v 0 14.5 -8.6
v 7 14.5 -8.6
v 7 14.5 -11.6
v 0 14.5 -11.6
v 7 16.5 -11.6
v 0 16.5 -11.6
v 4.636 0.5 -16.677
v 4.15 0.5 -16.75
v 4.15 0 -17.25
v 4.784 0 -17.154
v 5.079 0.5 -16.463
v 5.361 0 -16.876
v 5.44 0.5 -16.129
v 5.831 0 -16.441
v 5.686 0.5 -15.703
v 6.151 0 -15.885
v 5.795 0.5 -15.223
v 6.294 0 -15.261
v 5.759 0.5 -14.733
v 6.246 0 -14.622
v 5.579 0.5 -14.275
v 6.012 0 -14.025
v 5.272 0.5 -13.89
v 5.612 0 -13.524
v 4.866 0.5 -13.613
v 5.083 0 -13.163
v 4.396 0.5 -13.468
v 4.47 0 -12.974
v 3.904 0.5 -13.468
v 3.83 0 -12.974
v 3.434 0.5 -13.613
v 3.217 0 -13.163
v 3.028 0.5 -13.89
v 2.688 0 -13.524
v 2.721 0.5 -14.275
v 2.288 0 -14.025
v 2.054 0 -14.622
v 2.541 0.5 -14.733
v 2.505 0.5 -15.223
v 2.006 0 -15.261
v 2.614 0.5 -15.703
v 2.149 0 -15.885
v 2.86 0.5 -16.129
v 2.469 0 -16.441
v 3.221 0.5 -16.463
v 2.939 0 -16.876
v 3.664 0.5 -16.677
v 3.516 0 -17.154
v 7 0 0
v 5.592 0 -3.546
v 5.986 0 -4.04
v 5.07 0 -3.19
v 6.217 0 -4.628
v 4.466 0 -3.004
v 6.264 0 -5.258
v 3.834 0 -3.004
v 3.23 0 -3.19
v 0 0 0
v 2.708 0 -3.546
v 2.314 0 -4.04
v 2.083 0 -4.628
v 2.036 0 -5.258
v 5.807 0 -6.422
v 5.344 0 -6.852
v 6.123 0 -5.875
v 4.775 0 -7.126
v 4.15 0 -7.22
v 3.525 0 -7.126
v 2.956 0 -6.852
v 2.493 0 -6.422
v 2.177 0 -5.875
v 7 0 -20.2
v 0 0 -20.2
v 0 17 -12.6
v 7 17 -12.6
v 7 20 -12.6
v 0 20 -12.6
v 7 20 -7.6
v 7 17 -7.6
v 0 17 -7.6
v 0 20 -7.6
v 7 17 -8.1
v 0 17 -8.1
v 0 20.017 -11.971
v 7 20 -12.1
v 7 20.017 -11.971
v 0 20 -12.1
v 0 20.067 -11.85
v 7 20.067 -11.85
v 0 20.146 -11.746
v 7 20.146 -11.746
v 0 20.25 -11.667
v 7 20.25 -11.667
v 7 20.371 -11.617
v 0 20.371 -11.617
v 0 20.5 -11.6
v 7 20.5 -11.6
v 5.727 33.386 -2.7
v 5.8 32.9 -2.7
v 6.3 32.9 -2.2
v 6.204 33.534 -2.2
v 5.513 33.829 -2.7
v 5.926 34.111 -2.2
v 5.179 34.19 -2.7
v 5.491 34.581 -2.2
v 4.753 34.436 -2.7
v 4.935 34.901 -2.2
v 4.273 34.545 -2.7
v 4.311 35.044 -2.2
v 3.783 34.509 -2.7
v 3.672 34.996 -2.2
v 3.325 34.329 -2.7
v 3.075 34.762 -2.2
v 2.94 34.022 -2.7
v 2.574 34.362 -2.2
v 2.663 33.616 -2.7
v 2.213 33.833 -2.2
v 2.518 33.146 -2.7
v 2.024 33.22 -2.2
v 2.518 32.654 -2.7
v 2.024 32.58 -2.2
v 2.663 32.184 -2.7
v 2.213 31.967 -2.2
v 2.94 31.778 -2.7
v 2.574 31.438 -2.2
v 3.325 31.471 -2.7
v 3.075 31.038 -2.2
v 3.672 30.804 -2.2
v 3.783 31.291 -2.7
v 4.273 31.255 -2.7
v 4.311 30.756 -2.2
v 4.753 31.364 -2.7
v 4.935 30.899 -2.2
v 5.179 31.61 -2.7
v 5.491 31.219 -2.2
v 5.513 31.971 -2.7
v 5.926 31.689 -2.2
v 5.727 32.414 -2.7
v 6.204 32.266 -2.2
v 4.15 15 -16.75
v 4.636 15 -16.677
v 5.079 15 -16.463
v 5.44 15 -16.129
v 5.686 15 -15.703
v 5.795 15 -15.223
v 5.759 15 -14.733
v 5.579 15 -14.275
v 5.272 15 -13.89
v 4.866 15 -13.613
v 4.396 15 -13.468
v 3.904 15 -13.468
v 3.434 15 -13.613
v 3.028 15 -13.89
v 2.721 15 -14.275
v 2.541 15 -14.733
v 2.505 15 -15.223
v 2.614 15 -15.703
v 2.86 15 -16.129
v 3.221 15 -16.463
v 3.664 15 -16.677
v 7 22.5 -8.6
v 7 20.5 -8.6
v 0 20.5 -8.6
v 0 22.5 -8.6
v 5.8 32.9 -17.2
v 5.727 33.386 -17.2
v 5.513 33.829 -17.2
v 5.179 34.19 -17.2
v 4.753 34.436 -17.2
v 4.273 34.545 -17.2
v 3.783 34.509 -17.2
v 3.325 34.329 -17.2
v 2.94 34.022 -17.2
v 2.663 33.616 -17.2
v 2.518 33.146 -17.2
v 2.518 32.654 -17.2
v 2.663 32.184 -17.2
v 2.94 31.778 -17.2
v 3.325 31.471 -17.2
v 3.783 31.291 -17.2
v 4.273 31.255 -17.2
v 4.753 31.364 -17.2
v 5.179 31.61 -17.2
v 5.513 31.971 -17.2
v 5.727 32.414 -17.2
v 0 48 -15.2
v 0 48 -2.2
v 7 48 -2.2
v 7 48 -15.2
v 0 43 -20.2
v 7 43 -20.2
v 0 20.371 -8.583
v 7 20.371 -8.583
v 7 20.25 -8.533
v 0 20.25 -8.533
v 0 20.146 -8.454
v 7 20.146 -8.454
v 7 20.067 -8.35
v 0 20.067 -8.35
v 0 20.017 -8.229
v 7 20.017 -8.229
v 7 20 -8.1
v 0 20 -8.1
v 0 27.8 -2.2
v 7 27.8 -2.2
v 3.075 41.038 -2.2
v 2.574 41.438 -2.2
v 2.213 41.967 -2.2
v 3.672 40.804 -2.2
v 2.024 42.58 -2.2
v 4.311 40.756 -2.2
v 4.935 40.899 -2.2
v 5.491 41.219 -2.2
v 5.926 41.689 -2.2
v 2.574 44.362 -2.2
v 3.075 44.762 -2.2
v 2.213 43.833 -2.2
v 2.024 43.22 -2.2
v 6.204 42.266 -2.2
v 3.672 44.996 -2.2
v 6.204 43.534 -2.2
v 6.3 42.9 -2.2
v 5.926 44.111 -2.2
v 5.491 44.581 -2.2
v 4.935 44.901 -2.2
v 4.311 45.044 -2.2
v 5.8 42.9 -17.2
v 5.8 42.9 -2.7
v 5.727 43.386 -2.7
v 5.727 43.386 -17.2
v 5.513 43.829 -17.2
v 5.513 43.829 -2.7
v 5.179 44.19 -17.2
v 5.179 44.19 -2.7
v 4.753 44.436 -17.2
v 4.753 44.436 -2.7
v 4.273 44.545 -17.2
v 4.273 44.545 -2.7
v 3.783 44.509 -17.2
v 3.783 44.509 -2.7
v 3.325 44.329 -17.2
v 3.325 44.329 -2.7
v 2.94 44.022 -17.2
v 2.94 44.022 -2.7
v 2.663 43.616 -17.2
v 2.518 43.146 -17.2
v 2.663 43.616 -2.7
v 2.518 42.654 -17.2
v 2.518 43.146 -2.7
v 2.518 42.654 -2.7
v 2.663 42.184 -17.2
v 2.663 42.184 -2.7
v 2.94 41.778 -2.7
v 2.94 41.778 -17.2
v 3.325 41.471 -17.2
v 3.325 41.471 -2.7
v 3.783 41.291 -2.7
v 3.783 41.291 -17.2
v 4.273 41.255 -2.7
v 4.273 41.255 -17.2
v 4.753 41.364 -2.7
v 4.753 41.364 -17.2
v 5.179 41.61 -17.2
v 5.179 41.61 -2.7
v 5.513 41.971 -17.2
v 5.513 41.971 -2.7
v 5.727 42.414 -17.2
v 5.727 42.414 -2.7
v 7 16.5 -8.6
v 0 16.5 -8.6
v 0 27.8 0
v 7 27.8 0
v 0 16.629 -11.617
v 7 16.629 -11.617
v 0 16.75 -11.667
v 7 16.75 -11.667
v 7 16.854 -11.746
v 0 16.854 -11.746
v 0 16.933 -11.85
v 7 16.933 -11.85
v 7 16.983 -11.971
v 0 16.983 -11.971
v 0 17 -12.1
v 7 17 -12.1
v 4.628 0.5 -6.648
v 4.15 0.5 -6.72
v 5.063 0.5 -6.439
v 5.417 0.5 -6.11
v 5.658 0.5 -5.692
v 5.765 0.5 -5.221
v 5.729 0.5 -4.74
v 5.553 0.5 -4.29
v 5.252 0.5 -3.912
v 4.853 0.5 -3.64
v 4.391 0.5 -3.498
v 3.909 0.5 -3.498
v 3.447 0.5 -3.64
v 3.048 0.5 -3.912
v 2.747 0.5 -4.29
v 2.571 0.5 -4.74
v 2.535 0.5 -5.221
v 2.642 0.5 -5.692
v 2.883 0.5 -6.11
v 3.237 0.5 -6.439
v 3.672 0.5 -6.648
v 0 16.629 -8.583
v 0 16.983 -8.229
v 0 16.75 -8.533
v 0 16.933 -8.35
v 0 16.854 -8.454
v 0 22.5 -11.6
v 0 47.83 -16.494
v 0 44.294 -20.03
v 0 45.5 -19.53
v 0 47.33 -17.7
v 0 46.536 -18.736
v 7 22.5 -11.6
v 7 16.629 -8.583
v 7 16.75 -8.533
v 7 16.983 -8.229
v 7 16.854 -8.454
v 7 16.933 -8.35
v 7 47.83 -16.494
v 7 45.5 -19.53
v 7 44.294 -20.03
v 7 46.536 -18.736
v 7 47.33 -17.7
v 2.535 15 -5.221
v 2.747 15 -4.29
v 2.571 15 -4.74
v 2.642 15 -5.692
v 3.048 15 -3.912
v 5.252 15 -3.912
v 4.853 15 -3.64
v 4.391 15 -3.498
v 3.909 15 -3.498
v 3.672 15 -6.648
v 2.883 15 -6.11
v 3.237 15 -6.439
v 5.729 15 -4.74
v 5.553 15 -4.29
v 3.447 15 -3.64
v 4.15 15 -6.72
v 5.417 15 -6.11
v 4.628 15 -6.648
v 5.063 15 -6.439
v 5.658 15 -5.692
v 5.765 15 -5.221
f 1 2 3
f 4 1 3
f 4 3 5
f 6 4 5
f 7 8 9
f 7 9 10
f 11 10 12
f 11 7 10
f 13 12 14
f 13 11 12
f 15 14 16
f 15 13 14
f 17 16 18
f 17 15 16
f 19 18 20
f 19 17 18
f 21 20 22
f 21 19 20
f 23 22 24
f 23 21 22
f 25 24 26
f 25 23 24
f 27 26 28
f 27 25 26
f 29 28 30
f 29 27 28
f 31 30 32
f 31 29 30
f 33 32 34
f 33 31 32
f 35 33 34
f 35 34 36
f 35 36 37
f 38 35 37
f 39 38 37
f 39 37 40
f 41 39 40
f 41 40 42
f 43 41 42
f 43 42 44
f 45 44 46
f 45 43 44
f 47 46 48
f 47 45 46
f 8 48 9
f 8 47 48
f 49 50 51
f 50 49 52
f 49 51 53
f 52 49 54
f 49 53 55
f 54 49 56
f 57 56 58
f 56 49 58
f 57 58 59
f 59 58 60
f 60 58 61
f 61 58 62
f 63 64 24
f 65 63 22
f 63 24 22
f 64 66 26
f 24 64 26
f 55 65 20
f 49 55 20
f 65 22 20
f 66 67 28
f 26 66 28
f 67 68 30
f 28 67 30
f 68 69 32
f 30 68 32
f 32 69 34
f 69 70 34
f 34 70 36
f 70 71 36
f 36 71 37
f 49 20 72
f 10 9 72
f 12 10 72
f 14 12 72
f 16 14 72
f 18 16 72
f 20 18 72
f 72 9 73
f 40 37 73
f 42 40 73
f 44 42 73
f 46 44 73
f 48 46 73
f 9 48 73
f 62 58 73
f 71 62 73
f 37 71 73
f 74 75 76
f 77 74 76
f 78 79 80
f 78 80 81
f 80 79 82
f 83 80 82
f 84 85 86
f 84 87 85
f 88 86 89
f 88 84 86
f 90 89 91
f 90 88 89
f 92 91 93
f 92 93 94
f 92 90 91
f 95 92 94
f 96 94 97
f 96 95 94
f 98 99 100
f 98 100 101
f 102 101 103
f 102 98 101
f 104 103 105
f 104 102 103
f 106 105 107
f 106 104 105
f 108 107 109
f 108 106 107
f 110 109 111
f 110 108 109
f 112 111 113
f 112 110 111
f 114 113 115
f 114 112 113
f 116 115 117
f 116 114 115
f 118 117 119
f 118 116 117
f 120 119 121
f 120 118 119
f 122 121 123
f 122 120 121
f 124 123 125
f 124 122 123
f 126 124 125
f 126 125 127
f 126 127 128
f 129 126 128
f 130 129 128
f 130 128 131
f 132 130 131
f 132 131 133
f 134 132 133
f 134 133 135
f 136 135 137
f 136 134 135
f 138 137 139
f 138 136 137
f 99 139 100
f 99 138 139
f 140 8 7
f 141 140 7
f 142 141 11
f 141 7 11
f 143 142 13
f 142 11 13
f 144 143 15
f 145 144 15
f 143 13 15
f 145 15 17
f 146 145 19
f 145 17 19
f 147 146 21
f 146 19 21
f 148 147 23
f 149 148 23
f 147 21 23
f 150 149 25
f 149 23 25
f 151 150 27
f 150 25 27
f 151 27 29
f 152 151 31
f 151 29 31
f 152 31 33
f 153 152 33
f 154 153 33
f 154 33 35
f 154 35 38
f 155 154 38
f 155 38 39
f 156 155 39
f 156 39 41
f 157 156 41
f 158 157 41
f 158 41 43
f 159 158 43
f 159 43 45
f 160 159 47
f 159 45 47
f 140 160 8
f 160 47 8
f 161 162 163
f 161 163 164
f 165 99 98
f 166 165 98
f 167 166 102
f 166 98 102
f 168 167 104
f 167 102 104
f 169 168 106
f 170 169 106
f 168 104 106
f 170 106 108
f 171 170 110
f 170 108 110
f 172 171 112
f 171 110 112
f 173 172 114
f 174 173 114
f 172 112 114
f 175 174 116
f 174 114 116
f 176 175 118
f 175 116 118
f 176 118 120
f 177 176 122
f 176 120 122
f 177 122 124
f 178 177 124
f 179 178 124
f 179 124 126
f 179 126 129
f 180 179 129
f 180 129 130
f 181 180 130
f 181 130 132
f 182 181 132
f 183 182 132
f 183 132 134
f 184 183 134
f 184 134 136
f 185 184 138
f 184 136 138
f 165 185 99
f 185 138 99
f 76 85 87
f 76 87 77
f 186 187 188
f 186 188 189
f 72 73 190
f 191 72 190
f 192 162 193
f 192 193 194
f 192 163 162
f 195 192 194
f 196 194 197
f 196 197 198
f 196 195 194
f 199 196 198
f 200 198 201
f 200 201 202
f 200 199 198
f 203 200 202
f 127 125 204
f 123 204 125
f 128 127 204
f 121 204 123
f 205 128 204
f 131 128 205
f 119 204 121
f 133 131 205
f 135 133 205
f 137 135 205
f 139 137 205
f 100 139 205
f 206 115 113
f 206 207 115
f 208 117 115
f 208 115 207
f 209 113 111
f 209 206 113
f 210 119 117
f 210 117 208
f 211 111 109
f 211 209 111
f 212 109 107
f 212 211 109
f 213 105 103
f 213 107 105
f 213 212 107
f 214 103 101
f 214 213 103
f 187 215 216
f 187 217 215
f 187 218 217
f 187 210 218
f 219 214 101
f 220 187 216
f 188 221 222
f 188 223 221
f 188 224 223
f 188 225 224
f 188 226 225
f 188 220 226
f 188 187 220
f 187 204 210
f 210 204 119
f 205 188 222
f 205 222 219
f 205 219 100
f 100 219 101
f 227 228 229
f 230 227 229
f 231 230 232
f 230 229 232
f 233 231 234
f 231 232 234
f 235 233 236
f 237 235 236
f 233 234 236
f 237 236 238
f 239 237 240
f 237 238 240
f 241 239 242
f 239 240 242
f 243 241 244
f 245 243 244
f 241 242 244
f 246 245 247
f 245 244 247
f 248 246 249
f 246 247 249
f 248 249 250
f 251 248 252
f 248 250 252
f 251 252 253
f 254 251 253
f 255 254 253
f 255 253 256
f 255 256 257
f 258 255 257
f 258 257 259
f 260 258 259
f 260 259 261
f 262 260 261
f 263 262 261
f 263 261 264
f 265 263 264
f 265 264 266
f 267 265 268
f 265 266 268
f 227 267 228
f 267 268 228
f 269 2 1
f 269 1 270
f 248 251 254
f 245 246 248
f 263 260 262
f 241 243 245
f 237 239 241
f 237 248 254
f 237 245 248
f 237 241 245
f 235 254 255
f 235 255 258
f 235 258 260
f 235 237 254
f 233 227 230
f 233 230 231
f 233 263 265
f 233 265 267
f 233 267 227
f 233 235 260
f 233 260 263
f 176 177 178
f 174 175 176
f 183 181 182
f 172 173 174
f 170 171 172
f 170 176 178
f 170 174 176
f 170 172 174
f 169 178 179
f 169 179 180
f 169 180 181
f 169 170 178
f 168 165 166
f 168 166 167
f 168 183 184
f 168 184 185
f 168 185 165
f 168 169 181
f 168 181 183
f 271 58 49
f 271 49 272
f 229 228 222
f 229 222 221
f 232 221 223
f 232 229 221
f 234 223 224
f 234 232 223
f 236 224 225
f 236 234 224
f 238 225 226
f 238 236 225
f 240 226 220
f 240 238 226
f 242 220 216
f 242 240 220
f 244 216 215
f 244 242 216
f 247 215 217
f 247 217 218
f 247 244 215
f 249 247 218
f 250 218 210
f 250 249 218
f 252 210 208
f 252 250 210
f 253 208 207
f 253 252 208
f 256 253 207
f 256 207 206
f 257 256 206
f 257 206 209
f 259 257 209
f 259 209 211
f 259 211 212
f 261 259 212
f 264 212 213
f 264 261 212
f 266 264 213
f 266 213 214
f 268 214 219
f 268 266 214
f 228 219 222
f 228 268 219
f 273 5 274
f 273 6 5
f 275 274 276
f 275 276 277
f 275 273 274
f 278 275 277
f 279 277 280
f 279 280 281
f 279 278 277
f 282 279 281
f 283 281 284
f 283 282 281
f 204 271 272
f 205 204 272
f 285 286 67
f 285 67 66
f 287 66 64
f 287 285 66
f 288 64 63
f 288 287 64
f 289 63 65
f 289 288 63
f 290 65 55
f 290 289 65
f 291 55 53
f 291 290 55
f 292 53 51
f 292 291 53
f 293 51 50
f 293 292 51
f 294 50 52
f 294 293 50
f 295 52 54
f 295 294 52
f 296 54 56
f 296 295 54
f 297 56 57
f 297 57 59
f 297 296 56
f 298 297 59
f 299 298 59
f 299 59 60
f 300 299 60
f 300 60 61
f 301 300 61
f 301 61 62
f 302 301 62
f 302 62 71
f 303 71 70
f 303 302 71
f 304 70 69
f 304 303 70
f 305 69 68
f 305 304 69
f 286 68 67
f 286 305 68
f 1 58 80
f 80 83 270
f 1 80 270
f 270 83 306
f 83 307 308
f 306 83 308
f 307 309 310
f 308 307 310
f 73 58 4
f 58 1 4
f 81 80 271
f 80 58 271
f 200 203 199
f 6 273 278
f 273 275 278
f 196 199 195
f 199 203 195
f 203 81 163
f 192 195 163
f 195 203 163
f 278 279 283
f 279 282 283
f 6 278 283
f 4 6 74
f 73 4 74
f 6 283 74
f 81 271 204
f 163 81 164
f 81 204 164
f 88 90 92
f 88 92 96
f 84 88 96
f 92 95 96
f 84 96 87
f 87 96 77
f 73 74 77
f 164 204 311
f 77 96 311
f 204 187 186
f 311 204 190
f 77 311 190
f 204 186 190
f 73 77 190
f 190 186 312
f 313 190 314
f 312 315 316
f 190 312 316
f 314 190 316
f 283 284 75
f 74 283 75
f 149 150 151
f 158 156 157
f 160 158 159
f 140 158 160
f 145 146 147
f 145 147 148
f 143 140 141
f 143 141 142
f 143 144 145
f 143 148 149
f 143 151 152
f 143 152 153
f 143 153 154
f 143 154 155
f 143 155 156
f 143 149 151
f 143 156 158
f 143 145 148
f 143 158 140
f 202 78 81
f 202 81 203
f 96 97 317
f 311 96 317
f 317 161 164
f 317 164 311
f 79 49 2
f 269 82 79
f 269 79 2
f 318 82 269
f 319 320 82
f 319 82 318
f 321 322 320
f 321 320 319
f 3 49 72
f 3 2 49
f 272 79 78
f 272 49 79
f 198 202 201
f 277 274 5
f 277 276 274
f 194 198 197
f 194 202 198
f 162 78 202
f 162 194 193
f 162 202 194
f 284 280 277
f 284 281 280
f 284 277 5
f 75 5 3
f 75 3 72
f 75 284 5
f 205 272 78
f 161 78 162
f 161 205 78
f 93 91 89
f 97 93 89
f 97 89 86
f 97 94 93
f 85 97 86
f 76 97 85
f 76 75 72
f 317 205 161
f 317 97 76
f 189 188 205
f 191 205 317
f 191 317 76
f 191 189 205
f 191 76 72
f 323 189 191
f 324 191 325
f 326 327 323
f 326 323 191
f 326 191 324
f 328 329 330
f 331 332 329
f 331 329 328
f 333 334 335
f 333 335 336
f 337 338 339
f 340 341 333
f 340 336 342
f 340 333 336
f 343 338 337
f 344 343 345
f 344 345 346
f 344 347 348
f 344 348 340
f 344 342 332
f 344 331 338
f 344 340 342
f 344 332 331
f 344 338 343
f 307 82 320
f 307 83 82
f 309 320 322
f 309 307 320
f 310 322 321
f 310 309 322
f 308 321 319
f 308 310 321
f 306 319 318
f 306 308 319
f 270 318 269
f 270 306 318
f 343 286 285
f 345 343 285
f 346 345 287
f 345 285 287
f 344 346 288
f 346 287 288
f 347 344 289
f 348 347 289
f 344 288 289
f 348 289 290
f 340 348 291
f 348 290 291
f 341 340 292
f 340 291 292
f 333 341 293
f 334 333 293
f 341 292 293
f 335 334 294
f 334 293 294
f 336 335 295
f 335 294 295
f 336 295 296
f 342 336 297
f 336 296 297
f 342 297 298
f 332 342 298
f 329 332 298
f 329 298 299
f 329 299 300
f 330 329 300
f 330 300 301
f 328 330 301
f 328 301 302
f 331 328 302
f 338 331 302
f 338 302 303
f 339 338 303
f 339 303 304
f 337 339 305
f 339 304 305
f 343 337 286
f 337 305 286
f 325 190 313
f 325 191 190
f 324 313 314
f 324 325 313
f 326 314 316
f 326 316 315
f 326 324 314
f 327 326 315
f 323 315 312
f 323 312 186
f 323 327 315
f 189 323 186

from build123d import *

# Parameters (mm, degrees)
CROQUIS1_W              = 20.2
CROQUIS1_H              = 48
SALIENTE_EXTRUIR1_DEPTH = 7
CROQUIS2_W              = 7
CROQUIS2_H              = 20.2
CORTAR_EXTRUIR1_DEPTH   = 2.2
CROQUIS3_R              = 1.62
CROQUIS3_R_2            = 1.65
CORTAR_EXTRUIR2_DEPTH   = 15
CROQUIS4_R              = 1.65
CORTAR_EXTRUIR3_DEPTH   = 15
CHAFL_N1_SIZE           = 0.5
REDONDEO1_R             = 5
CROQUIS5_W              = 5
CROQUIS5_H              = 3
CORTAR_EXTRUIR4_DEPTH   = 7
CROQUIS6_W              = 3
CROQUIS6_H              = 2.5
CORTAR_EXTRUIR5_DEPTH   = 7
REDONDEO2_R             = 0.5


with BuildPart() as part:
    # Croquis1 → Saliente-Extruir1 (new body)
    with BuildSketch(Plane(origin=(0, 0, 0), x_dir=(0, 0, -1), z_dir=(1, 0, 0))):
        with Locations((10.1, 24)):
            Rectangle(CROQUIS1_W, CROQUIS1_H)
    extrude(amount=SALIENTE_EXTRUIR1_DEPTH)

    # Croquis2 → Cortar-Extruir1 (cut)
    with BuildSketch(Plane.XY):
        with Locations((3.5, 37.9)):
            Rectangle(CROQUIS2_W, CROQUIS2_H)
    extrude(amount=-CORTAR_EXTRUIR1_DEPTH, mode=Mode.SUBTRACT)

    # Croquis3 → Cortar-Extruir2 (cut)
    with BuildSketch(Plane.XZ):
        with Locations(Location((4.15, -5.1, 0), (0, 0, 270))):
            Circle(CROQUIS3_R)
        with Locations(Location((4.15, -15.1, 0), (0, 0, 270))):
            Circle(CROQUIS3_R_2)
    extrude(amount=-CORTAR_EXTRUIR2_DEPTH, mode=Mode.SUBTRACT)

    # Croquis4 → Cortar-Extruir3 (cut)
    with BuildSketch(Plane.XY.offset(-2.2)):
        with Locations((4.15, 32.9)):
            Circle(CROQUIS4_R)
        with Locations((4.15, 42.9)):
            Circle(CROQUIS4_R)
    extrude(amount=-CORTAR_EXTRUIR3_DEPTH, mode=Mode.SUBTRACT)

    # Chaflán1
    chafl_n1_edges = [part.edges().sort_by_distance(p)[0] for p in [
        (4.15, 0, -3.48),
        (4.15, 0, -13.45),
        (2.5, 42.9, -2.2),
        (2.5, 32.9, -2.2),
    ]]
    chamfer(chafl_n1_edges, length=CHAFL_N1_SIZE)

    # Redondeo1
    redondeo1_edges = [part.edges().sort_by_distance(p)[0] for p in [
        (3.5, 48, -20.2),
    ]]
    fillet(redondeo1_edges, radius=REDONDEO1_R)

    # Croquis5 → Cortar-Extruir4 (cut)
    with BuildSketch(Plane(origin=(7, 0, 0), x_dir=(0, 0, -1), z_dir=(1, 0, 0))):
        with Locations((10.1, 18.5)):
            Rectangle(CROQUIS5_W, CROQUIS5_H)
    extrude(amount=-CORTAR_EXTRUIR4_DEPTH, mode=Mode.SUBTRACT)

    # Croquis6 → Cortar-Extruir5 (cut)
    with BuildSketch(Plane(origin=(7, 0, 0), x_dir=(0, 0, -1), z_dir=(1, 0, 0))):
        with Locations((10.1, 21.25)):
            Rectangle(CROQUIS6_W, CROQUIS6_H)
        with Locations((10.1, 15.75)):
            Rectangle(CROQUIS6_W, CROQUIS6_H)
    extrude(amount=-CORTAR_EXTRUIR5_DEPTH, mode=Mode.SUBTRACT)

    # Redondeo2
    redondeo2_edges = [part.edges().sort_by_distance(p)[0] for p in [
        (3.5, 17, -8.6),
        (3.5, 20, -8.6),
        (3.5, 20, -11.6),
        (3.5, 17, -11.6),
    ]]
    fillet(redondeo2_edges, radius=REDONDEO2_R)


solid = part.part
